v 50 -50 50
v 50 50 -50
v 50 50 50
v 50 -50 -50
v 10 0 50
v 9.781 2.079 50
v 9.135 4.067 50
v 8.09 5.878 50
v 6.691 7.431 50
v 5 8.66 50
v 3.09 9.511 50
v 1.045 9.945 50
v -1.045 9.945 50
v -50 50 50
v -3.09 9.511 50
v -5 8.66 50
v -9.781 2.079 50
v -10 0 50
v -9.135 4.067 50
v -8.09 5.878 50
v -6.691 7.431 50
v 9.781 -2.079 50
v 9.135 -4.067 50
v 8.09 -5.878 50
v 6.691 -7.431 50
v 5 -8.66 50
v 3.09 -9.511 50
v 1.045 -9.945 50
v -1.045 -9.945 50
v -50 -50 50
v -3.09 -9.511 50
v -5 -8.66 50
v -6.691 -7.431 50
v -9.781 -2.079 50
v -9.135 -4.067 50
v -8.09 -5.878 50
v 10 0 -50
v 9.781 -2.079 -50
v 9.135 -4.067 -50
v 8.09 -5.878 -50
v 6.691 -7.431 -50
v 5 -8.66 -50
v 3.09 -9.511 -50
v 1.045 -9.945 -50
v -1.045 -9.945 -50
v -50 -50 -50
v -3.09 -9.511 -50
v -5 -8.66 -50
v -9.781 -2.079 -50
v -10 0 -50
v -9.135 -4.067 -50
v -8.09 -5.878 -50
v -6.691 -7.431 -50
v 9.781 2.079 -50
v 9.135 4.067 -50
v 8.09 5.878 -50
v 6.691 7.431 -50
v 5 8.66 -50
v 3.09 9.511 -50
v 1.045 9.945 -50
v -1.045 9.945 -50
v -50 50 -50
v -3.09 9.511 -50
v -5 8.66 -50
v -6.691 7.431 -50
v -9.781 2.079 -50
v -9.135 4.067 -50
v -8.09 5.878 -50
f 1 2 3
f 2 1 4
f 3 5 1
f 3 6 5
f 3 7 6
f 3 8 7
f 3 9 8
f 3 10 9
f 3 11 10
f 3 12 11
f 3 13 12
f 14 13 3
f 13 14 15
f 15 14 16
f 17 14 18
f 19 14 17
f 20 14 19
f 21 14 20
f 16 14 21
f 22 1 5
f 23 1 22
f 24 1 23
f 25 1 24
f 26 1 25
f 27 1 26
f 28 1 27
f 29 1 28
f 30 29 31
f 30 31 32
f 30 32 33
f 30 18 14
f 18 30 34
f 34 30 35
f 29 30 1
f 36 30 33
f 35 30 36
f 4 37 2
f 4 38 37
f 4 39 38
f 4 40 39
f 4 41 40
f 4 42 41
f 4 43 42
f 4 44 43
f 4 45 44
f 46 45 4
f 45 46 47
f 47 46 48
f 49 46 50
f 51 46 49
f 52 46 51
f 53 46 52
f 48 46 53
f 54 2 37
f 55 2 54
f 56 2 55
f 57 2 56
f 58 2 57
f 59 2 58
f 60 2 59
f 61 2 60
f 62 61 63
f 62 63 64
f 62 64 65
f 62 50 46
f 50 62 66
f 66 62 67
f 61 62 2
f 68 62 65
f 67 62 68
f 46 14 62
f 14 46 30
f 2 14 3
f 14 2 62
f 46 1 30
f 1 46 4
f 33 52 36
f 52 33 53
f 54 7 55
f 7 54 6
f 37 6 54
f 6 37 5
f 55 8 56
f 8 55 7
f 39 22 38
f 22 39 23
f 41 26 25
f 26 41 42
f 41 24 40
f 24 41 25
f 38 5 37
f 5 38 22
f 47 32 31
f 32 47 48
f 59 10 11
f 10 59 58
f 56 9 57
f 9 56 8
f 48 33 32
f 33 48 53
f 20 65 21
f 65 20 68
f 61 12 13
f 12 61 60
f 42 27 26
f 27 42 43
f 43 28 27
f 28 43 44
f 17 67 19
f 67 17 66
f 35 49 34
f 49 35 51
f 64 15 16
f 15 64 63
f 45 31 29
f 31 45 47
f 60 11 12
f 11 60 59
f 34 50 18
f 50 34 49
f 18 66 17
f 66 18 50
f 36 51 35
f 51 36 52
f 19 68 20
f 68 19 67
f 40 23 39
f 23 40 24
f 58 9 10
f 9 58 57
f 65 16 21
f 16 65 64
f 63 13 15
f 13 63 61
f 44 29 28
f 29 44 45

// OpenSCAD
difference() {
  cube(100, center = true);
  cylinder(r = 10, h = 100, center = true);
}
